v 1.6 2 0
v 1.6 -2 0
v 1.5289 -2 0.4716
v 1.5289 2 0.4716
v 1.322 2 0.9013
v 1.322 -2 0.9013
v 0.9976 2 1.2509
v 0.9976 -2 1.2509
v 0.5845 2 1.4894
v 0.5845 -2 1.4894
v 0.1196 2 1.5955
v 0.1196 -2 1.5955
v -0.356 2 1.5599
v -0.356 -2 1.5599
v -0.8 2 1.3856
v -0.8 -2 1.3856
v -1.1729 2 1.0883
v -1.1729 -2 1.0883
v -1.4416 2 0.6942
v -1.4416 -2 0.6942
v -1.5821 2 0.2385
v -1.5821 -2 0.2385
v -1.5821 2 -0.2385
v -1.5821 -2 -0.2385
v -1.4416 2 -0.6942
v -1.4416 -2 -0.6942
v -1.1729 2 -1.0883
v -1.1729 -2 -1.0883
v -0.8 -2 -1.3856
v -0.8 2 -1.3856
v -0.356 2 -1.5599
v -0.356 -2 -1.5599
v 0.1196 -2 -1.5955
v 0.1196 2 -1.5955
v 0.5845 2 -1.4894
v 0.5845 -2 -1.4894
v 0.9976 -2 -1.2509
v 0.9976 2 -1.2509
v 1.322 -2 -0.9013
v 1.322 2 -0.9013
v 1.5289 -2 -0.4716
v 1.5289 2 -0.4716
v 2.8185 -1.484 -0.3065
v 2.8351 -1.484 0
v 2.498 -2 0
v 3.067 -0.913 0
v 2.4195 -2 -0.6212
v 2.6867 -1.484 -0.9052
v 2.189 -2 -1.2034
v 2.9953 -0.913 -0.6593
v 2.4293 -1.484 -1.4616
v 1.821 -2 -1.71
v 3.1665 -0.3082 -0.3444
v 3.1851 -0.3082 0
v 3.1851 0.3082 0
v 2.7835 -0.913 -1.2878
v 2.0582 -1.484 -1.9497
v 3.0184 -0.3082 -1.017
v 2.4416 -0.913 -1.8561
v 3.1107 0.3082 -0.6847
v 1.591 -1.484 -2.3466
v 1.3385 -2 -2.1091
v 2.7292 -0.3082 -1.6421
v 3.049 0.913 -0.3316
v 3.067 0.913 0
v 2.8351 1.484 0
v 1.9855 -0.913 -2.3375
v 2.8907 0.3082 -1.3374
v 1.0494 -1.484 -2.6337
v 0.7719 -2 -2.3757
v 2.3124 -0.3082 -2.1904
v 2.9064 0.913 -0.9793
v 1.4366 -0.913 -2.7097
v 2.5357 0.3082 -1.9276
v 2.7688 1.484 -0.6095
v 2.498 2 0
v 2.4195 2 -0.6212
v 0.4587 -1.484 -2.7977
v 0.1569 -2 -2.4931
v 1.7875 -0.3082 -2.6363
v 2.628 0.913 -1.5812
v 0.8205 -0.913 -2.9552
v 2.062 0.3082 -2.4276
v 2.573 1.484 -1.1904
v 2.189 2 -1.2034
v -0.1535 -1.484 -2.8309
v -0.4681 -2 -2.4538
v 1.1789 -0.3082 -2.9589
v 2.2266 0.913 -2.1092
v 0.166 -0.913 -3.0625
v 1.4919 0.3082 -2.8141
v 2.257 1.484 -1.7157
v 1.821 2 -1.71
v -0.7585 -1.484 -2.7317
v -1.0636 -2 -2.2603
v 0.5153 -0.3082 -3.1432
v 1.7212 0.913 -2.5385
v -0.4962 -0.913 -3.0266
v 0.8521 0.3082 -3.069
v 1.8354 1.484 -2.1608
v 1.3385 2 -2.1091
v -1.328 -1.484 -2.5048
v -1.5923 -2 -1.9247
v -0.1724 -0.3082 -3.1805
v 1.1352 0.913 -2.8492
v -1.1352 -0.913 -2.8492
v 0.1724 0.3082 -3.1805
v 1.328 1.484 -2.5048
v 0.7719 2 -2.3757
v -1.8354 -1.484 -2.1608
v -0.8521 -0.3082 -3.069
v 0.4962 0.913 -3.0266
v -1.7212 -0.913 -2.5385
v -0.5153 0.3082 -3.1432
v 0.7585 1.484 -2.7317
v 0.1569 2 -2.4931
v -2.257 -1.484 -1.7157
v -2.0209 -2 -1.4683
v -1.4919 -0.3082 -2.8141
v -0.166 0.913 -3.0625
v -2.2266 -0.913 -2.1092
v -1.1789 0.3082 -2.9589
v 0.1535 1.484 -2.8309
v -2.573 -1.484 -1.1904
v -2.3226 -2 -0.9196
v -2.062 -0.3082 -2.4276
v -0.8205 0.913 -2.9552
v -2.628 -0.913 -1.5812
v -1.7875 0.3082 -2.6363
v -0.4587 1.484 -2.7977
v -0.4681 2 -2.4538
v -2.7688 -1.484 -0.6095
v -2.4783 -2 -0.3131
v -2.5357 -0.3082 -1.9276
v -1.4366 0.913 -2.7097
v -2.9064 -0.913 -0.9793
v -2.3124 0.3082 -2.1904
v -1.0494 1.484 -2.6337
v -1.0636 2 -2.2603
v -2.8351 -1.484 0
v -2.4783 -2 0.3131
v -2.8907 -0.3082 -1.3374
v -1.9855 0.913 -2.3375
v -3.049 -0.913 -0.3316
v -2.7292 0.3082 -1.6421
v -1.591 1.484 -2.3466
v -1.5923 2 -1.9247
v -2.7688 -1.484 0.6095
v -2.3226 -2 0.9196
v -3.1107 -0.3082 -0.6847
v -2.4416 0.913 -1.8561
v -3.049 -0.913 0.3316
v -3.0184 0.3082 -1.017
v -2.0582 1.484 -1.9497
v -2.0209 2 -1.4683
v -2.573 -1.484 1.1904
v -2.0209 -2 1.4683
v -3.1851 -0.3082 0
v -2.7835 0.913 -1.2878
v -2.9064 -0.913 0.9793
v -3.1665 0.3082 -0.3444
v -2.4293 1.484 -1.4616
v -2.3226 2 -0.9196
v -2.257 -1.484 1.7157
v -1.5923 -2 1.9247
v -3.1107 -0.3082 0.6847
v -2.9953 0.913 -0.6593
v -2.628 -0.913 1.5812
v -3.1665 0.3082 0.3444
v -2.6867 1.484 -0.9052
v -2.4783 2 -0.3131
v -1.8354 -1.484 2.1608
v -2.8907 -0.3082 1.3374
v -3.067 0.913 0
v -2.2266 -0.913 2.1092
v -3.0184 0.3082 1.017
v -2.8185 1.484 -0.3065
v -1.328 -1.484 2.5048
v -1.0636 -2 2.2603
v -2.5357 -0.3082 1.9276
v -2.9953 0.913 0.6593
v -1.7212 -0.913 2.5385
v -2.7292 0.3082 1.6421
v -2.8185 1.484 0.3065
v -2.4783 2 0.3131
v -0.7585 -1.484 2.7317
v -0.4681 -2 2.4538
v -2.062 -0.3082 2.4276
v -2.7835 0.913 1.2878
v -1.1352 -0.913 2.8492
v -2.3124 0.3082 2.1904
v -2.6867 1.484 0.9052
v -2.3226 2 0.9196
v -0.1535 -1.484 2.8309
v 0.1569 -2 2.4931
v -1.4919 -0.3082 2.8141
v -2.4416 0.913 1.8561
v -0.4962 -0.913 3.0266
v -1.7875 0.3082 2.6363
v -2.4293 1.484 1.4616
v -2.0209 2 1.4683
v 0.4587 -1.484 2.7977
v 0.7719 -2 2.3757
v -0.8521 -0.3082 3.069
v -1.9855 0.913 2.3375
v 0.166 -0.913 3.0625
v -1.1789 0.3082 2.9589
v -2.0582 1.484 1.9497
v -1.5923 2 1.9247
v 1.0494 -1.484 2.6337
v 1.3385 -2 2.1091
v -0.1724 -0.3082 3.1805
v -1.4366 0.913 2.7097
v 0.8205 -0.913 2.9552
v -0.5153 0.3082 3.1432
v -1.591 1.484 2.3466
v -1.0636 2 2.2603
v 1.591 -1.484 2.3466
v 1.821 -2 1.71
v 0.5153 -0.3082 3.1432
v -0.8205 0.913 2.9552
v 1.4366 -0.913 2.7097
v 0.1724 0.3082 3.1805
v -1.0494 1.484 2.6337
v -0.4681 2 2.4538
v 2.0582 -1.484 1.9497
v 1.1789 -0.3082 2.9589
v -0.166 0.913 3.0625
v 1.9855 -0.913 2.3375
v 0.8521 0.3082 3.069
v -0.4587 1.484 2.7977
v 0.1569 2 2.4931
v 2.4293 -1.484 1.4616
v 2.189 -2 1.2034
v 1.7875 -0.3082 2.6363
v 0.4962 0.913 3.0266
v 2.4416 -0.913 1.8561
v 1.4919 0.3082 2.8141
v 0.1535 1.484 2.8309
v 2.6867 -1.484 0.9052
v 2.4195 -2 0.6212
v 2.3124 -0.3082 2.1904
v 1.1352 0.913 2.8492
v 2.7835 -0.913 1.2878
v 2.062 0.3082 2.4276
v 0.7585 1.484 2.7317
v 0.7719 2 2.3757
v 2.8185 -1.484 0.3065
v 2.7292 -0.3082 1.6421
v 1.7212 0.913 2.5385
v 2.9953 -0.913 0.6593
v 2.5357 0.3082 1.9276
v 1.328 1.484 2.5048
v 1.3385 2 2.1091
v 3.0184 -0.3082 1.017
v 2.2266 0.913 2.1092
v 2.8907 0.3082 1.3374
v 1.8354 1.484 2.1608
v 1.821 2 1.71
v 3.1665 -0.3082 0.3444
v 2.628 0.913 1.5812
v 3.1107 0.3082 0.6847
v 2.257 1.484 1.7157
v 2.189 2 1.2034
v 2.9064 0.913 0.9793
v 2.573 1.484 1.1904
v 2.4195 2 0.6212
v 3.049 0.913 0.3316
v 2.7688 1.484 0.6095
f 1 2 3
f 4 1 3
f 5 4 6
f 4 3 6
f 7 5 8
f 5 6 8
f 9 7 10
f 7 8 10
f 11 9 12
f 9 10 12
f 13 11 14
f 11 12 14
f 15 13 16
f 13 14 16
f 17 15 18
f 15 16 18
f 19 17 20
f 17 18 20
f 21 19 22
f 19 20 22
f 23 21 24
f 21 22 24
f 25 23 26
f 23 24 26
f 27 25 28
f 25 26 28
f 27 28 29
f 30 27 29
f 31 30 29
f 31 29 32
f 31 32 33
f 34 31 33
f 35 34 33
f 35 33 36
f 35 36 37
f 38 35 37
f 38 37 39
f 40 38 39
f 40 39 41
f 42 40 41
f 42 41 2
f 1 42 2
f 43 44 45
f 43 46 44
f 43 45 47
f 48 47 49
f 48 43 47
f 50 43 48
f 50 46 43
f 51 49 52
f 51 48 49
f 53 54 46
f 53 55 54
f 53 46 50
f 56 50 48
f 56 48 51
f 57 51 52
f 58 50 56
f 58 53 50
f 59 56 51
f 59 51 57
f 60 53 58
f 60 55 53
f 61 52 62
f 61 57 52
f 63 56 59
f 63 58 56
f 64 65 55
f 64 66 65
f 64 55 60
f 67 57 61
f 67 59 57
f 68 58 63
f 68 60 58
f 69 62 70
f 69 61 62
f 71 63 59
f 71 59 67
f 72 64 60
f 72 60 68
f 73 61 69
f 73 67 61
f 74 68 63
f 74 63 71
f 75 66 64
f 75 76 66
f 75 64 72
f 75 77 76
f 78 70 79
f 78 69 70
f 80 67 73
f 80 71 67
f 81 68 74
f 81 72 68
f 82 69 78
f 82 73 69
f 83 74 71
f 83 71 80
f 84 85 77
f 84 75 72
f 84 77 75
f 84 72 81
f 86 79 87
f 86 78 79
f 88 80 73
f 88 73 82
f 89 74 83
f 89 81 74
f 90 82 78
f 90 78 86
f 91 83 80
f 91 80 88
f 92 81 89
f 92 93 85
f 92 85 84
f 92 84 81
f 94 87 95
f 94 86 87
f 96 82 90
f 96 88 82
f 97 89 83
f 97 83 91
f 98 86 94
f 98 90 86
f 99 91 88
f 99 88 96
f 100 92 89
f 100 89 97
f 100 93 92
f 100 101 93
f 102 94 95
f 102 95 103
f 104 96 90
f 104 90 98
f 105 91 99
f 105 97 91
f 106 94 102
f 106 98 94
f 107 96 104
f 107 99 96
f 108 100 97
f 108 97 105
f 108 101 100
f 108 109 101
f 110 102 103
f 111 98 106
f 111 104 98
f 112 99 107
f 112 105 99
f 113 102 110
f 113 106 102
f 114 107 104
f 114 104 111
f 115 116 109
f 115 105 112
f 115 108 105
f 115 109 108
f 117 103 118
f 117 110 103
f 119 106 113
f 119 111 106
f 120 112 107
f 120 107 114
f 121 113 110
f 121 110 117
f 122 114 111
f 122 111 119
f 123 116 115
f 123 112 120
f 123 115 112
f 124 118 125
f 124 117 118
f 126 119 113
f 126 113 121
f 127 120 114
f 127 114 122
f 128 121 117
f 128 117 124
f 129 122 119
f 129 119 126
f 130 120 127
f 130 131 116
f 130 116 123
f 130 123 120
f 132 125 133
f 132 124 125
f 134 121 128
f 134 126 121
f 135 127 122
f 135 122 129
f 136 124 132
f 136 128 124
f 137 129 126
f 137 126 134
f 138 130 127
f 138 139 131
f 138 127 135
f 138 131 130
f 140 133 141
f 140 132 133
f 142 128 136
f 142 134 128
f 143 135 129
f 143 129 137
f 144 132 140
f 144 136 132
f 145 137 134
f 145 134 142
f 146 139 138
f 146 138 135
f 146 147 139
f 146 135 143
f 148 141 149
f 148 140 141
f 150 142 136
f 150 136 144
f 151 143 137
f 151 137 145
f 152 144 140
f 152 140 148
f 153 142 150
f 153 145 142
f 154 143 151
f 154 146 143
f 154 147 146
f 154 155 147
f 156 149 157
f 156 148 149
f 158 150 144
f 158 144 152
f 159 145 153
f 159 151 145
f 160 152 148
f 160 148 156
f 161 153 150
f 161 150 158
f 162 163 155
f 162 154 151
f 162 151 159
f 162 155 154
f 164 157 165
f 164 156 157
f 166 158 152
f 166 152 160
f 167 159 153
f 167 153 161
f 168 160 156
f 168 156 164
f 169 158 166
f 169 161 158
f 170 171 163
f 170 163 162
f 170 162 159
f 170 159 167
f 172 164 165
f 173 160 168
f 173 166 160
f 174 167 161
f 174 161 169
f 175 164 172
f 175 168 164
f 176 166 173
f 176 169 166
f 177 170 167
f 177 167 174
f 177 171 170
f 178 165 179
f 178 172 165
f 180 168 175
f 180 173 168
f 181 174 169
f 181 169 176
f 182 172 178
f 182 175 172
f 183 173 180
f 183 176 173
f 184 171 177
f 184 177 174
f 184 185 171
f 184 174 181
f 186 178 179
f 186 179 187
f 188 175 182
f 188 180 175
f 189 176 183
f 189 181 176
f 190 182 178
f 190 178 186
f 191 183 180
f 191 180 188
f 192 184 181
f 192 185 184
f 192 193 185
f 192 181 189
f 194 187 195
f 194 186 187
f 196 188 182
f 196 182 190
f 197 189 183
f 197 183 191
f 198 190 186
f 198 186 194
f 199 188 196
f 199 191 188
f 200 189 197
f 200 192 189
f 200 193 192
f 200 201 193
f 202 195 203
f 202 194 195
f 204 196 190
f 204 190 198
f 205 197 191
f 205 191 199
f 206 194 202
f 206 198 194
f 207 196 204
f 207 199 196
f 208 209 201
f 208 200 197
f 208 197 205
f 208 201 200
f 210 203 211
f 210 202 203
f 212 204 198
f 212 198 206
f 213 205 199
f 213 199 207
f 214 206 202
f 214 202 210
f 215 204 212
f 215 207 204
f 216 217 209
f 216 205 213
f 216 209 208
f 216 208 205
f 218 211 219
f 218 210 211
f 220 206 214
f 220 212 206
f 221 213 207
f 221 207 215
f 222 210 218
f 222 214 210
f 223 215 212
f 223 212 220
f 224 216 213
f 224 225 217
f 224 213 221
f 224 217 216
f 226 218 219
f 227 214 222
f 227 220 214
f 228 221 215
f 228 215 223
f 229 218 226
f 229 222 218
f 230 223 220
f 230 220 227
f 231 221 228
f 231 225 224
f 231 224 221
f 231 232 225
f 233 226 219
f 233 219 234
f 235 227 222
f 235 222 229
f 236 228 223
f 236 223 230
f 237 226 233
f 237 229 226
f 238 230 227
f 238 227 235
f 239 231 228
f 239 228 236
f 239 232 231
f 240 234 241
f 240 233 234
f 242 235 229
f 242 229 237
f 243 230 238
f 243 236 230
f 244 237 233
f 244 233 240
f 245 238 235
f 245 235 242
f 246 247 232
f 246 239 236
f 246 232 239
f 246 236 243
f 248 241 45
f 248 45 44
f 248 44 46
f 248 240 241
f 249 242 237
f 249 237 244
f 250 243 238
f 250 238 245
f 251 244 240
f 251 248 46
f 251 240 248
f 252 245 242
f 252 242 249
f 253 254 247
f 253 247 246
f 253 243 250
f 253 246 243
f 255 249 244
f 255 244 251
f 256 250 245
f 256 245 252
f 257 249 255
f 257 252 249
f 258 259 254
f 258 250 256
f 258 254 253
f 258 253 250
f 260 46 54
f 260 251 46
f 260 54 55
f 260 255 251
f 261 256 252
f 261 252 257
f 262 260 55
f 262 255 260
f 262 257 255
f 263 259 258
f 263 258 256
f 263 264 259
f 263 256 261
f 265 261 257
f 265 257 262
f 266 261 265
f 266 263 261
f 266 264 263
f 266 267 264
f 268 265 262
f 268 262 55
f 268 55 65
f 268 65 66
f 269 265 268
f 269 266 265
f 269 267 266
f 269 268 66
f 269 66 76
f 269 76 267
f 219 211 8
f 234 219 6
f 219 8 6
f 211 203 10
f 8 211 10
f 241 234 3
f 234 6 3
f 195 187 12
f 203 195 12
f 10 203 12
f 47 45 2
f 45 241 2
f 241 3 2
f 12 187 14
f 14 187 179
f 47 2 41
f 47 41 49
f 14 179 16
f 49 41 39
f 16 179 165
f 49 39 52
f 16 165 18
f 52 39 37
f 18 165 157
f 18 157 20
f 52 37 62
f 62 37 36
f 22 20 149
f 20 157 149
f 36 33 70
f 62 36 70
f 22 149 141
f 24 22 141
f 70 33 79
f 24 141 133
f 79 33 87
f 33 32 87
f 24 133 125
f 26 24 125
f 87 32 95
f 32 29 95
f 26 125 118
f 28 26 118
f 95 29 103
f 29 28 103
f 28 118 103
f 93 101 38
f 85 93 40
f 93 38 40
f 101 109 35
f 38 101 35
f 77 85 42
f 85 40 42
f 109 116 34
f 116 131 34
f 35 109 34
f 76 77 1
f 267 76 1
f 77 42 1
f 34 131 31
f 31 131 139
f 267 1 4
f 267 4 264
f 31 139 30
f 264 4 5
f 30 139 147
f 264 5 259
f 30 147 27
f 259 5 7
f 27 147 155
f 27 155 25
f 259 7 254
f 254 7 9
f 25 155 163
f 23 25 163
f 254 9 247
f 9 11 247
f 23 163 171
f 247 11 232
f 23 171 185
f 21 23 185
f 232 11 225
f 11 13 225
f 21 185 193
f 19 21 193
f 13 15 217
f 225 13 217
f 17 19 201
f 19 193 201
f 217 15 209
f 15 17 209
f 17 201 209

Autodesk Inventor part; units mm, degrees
ref_plane "YZ Plane" through (0, 0, 0) normal (1, 0, 0) x (0, 1, 0)
ref_plane "XZ Plane" through (0, 0, 0) normal (0, 1, 0) x (-1, 0, 0)
ref_plane "XY Plane" through (0, 0, 0) normal (0, 0, 1) x (1, 0, 0)
sketch "Sketch1" plane through (0, 0, 0) normal (0, 0, 1) x (1, 0, 0)
  arc A0 (0, -3.2) -> (0, 3.2) centre (0, 0) ccw
  line L0 (0, 3.2) -> (0, -3.2)
  dimension "d0" = 6.4
revolve "Revolution1" add sketch "Sketch1" angle 360 about axis through (0, 3.2, 0) along (0, -1, 0)
sketch "Sketch2" plane through (0, 0, 0) normal (1, 0, 0) x (0, 1, 0)
  line L0 (2, 8.8306) -> (-2, 8.8306)
  line L1 (-2, 8.8306) -> (-2, -8.8306)
  line L2 (-2, -8.8306) -> (2, -8.8306)
  line L3 (2, -8.8306) -> (2, 8.8306)
  line L4 (2, 8.8306) -> (-2, -8.8306) construction
  line L5 (-2, 8.8306) -> (2, -8.8306) construction
  line L6 (6.1175, 19.2226) -> (-9.7521, 19.2226)
  line L7 (-9.7521, 19.2226) -> (-9.7521, -16.6118)
  line L8 (-9.7521, -16.6118) -> (6.1175, -16.6118)
  line L9 (6.1175, -16.6118) -> (6.1175, 19.2226)
  point P0 (0, 0)
  dimension "d2" = 4
extrude "Extrusion1" cut sketch "Sketch2" along normal through all both and the other way through all
sketch "Sketch3" plane through (0, -2, 0) normal (0, -1, 0) x (1, 0, 0)
  circle A0 centre (0, 0) radius 2.498 projected
  circle A1 centre (0, 0) radius 1.6
  dimension "d5" = 3.2
extrude "Extrusion2" cut sketch "Sketch3" against normal through all contours A1
properties part number "500-109" material "Aluminum 6061"
